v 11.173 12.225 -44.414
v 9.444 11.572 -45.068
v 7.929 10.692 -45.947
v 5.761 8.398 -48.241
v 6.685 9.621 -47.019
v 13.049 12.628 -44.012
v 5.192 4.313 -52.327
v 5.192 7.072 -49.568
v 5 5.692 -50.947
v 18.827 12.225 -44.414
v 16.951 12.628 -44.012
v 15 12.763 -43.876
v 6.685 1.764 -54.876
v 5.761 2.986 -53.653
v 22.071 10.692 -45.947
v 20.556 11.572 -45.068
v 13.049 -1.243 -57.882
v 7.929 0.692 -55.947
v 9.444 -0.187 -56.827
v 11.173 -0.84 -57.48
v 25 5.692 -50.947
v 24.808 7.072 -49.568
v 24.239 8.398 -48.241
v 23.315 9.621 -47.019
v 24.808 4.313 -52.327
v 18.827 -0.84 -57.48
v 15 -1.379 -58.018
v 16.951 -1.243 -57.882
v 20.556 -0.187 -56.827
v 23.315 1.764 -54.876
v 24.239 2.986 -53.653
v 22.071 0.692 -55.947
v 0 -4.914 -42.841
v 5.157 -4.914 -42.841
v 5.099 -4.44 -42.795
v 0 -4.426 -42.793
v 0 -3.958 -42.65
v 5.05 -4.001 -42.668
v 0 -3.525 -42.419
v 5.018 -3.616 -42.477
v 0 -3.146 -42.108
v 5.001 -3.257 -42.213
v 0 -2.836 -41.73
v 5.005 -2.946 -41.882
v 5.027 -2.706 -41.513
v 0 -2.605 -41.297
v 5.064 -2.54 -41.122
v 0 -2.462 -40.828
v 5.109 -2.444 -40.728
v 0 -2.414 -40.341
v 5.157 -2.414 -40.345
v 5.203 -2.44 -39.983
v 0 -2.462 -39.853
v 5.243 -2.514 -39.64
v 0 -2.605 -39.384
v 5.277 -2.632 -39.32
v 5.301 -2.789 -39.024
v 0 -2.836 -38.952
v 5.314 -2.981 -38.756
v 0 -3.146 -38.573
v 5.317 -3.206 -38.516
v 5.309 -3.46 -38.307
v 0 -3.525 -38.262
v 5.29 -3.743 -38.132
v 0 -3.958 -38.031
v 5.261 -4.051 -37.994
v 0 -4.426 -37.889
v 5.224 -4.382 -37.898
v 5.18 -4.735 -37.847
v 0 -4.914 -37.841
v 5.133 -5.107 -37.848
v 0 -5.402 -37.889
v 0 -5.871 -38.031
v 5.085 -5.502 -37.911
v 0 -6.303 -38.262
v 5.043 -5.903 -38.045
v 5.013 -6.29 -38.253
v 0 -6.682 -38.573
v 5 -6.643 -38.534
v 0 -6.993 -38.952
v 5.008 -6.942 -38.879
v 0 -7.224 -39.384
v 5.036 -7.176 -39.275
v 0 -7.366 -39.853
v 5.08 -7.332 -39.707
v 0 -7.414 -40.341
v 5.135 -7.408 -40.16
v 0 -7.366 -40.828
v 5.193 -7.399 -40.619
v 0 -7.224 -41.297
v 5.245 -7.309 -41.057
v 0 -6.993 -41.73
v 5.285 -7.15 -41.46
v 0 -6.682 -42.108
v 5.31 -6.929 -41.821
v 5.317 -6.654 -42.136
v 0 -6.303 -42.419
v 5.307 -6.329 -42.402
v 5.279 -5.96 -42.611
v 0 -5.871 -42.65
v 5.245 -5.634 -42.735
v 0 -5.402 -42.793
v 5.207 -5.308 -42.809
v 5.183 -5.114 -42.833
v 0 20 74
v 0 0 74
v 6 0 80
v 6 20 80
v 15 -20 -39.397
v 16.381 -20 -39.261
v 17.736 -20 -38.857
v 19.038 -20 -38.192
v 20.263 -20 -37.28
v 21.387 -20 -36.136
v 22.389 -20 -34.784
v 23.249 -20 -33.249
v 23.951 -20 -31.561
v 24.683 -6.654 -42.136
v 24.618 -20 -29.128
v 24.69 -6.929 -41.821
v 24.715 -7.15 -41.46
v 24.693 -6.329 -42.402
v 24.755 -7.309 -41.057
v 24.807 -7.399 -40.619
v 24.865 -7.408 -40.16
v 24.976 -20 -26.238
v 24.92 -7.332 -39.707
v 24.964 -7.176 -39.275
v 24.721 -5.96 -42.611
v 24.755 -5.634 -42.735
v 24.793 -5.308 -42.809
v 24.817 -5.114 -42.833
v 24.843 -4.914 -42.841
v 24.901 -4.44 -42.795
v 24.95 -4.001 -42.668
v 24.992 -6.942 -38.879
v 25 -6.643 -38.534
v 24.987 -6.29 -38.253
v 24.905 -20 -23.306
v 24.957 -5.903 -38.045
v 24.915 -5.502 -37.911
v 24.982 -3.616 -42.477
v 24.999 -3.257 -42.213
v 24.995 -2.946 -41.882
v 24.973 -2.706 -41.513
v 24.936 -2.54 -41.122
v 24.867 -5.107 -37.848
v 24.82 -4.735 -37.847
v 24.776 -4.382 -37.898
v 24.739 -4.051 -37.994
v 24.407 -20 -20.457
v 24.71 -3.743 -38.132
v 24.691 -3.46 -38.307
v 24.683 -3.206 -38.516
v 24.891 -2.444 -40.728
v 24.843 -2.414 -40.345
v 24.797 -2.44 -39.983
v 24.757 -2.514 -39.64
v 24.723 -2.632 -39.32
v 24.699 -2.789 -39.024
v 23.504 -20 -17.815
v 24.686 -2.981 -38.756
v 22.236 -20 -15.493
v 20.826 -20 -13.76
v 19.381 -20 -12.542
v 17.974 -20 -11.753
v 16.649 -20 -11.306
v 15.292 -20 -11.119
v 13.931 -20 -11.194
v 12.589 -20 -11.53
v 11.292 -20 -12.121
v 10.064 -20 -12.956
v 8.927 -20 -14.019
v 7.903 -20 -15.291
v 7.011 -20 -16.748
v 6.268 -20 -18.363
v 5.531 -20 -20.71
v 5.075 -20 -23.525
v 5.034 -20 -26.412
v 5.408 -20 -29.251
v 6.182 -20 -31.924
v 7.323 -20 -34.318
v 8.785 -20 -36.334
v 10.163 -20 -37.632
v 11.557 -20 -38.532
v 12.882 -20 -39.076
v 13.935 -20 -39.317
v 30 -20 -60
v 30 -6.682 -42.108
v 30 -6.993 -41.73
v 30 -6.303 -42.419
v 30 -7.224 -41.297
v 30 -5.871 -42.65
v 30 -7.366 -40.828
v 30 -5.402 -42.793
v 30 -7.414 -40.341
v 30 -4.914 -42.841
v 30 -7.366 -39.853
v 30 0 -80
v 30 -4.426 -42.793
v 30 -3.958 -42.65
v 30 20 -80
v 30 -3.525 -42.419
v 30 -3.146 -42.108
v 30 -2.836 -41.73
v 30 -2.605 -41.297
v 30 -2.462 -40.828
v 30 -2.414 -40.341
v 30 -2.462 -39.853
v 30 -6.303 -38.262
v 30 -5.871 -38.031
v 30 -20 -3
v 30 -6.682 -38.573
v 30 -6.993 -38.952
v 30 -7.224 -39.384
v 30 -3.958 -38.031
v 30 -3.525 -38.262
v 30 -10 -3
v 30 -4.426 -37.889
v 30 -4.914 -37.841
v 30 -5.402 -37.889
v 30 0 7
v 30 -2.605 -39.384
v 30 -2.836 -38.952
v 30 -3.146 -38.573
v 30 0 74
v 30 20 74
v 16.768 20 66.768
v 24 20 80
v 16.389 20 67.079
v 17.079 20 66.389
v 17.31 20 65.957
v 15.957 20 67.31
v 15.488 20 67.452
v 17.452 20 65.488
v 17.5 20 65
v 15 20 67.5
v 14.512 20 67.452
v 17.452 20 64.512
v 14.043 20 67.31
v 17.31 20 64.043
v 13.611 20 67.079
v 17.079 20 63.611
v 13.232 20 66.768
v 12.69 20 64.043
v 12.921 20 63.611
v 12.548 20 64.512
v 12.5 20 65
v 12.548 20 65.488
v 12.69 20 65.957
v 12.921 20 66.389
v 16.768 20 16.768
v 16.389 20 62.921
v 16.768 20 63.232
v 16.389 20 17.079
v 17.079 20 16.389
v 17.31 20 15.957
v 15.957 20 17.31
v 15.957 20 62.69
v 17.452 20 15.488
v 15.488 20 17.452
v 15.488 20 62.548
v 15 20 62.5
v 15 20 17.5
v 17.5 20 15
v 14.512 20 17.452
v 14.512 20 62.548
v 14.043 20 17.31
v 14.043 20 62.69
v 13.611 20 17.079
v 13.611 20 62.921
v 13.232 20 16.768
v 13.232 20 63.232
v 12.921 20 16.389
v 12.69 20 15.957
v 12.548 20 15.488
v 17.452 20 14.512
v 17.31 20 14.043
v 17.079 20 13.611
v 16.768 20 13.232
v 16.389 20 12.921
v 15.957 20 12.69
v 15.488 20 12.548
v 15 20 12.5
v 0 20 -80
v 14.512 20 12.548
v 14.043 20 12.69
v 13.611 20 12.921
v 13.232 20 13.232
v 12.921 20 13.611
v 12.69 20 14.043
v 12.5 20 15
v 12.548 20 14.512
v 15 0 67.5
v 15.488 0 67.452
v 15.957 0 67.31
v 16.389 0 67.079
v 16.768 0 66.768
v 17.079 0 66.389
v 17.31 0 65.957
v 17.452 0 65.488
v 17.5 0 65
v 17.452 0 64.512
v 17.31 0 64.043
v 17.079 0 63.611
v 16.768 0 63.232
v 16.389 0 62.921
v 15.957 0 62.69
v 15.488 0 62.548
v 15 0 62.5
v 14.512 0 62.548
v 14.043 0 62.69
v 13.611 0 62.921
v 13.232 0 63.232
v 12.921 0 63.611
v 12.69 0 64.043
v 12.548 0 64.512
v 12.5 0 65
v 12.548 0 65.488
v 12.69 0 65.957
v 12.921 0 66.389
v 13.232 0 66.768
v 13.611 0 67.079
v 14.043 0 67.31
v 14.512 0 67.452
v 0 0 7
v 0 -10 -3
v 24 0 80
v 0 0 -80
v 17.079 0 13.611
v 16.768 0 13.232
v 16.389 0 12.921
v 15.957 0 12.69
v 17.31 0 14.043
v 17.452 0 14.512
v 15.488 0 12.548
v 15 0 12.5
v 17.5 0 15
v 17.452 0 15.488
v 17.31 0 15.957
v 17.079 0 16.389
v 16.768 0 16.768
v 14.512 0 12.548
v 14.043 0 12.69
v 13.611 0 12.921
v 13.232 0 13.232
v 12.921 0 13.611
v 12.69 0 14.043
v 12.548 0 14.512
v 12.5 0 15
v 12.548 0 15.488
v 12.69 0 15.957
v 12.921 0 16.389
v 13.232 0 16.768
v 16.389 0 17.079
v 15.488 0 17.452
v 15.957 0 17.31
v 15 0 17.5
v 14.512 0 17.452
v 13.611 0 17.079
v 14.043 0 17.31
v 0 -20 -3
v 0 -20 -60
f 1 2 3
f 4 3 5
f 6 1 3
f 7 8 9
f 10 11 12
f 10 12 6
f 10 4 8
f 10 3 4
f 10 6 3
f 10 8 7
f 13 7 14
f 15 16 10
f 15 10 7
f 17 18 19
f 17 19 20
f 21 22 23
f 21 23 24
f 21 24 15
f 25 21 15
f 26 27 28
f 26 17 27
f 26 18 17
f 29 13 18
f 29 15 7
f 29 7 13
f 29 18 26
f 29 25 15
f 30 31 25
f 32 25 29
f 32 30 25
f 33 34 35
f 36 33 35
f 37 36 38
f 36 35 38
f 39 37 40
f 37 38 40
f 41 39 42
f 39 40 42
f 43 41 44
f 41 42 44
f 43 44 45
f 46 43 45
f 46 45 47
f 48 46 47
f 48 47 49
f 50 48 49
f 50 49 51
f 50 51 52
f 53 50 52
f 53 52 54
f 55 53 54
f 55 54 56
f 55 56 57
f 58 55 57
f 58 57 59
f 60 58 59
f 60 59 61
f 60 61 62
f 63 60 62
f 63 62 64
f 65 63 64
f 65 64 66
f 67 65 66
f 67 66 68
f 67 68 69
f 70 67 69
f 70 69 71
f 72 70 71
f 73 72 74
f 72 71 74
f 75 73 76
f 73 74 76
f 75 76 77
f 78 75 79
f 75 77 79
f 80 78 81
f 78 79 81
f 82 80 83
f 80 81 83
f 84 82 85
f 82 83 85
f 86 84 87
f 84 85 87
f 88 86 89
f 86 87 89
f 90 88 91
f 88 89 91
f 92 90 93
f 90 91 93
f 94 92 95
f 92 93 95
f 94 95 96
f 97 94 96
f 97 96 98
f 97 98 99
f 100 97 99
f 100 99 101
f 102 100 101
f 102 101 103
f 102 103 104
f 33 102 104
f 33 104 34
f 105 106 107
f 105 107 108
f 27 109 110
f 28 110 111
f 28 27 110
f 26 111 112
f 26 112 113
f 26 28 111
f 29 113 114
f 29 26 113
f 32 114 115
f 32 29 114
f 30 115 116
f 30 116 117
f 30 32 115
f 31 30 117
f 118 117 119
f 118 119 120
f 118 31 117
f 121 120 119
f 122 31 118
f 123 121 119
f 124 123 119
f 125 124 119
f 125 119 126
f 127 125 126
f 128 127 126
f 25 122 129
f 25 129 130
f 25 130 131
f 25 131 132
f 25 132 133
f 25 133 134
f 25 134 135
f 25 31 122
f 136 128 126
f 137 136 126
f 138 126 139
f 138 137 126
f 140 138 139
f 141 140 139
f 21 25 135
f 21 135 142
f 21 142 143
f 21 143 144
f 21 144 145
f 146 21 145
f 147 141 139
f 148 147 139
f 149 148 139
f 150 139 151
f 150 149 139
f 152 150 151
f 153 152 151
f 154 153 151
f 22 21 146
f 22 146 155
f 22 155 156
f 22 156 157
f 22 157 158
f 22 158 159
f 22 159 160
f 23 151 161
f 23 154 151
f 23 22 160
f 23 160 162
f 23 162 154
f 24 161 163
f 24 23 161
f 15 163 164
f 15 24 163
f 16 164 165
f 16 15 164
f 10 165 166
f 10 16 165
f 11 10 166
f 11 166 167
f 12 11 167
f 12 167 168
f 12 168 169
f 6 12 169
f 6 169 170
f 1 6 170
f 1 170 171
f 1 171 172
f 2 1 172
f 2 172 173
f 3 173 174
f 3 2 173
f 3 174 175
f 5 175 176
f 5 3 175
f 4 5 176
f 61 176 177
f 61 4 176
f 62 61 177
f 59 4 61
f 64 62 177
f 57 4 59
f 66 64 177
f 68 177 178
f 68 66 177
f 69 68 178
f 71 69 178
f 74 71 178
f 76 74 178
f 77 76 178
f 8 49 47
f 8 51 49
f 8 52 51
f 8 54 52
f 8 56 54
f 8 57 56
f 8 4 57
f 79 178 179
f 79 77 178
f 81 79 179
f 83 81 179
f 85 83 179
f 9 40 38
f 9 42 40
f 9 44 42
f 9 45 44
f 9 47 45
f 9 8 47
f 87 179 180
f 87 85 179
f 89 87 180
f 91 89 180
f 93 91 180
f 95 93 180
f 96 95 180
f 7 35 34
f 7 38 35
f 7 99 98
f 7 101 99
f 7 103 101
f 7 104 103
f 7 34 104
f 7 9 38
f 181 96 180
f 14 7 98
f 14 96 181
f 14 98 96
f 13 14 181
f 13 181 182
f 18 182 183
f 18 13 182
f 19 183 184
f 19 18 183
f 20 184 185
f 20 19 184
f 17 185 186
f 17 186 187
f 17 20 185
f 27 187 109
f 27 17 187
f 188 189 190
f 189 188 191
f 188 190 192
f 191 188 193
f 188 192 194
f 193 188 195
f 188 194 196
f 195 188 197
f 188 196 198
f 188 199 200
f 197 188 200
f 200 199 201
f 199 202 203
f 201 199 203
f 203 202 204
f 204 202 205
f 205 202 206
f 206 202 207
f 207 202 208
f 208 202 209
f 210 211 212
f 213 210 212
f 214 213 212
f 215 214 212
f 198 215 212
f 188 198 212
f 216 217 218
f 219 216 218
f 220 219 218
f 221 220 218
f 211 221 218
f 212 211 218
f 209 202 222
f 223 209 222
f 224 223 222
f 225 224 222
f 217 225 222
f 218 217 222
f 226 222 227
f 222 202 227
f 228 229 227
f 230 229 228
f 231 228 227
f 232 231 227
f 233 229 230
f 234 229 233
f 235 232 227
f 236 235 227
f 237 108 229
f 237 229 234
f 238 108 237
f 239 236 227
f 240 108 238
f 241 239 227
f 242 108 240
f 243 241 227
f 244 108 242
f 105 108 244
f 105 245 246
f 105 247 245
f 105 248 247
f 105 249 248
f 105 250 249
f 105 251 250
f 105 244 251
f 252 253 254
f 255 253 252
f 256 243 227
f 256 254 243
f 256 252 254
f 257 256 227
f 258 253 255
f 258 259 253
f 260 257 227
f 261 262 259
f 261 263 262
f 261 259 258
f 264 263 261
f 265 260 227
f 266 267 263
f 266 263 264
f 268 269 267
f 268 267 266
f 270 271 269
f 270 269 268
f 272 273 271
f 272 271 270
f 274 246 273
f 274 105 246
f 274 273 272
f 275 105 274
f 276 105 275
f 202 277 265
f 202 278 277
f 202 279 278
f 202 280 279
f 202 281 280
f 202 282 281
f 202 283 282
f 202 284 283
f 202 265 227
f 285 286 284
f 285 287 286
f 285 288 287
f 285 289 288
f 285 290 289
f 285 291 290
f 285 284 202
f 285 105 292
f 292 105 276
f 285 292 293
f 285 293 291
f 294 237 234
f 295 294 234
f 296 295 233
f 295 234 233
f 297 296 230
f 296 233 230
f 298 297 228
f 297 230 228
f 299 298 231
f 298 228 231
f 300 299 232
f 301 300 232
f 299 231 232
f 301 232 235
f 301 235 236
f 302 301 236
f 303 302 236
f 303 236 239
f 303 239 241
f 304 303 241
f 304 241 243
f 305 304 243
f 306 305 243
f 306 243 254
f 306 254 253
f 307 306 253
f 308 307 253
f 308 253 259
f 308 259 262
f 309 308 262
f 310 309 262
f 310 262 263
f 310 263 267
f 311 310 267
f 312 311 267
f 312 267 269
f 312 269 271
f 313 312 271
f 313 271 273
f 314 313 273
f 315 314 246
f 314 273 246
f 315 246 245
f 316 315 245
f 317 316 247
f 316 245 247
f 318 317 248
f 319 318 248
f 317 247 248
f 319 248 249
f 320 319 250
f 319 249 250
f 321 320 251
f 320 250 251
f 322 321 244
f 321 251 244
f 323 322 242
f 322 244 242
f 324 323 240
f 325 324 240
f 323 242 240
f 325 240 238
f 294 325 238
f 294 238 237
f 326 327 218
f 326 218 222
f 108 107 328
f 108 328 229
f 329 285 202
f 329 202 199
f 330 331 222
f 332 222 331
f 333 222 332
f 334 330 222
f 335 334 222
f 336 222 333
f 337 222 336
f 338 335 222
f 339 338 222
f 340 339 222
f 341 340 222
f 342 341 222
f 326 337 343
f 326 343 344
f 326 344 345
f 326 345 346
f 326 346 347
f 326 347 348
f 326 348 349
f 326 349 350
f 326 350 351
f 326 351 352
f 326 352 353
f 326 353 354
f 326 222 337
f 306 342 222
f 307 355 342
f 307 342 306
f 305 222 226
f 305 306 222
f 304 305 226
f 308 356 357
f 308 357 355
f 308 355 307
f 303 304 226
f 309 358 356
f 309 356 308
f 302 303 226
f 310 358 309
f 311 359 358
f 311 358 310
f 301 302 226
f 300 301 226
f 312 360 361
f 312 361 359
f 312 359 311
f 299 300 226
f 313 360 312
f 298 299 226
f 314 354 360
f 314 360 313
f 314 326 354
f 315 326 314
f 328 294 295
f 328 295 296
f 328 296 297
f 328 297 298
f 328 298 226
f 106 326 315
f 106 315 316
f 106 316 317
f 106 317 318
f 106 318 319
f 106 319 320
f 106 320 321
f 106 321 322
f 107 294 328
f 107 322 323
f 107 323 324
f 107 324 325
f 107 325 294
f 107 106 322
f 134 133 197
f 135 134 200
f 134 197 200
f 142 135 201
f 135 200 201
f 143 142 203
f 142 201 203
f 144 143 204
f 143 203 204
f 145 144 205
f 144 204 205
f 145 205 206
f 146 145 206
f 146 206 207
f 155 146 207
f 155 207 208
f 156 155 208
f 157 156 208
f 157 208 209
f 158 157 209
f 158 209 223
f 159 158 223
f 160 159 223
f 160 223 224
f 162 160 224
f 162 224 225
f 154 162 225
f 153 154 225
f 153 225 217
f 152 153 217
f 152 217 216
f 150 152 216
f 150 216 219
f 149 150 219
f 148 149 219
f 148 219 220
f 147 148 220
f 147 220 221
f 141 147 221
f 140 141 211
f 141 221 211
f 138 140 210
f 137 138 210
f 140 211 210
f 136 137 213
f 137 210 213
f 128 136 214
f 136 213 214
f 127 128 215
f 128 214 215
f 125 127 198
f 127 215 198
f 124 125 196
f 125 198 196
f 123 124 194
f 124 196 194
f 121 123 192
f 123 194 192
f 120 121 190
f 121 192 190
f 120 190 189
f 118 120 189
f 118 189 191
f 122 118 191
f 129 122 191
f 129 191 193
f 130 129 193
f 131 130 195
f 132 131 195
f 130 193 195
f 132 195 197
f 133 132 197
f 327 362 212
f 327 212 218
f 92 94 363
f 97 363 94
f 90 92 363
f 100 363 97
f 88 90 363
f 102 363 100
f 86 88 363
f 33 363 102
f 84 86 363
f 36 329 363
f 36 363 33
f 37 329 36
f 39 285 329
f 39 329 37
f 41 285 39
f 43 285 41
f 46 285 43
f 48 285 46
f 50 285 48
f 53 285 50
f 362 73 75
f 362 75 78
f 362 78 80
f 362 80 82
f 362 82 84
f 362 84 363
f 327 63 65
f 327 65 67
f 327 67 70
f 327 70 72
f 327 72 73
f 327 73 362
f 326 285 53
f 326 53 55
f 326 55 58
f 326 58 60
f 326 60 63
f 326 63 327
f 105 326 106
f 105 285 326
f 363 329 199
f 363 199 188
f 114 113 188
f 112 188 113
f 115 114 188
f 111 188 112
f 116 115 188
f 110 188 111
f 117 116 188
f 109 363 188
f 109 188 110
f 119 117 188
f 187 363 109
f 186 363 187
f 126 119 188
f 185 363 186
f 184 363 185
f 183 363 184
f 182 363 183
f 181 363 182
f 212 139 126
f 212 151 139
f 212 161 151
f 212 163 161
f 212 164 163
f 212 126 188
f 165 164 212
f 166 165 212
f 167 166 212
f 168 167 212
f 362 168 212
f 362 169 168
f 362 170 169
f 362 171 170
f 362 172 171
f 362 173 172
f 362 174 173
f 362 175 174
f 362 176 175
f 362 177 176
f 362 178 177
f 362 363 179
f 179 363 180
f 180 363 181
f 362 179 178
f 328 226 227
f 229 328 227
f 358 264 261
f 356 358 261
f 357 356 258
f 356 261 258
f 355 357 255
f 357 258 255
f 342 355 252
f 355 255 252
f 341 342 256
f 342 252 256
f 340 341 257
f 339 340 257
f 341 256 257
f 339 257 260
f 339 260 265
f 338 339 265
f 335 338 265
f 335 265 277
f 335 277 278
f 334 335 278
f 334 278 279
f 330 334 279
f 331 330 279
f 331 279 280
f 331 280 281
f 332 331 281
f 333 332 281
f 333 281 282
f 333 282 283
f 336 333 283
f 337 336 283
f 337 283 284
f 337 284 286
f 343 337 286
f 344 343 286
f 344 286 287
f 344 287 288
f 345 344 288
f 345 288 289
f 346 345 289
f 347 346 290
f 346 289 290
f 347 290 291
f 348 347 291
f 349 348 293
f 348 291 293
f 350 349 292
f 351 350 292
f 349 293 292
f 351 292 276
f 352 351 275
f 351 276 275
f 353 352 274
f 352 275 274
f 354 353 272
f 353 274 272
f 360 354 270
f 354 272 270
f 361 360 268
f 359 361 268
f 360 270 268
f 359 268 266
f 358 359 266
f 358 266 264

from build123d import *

# Parameters (mm, degrees)
Y_KSEKLIK_EKSTR_ZYON2_DEPTH = 30
IZIM3_R                     = 2.5
KES_EKSTR_ZYON1_DEPTH       = 30
PAH1_SIZE                   = 6
KES_EKSTR_ZYON2_DEPTH       = 30
KES_EKSTR_ZYON2_DEPTH_BACK  = 30
IZIM5_R                     = 10
IZIM6_R                     = 10
KES_EKSTR_ZYON3_DEPTH       = 15
IZIM7_R                     = 2.5
KES_EKSTR_ZYON4_DEPTH       = 48


with BuildPart() as part:
    # Çizim2 → Yükseklik-Ekstrüzyon2 (new body)
    with BuildSketch(Plane(origin=(0, 0, 0), x_dir=(0, 0, -1), z_dir=(1, 0, 0))):
        Polygon((-80, 20), (80, 20), (80, 0), (60, -20), (3, -20), (3, -10), (-7, 0), (-80, 0), align=None)
    extrude(amount=Y_KSEKLIK_EKSTR_ZYON2_DEPTH)

    # Çizim3 → Kes-Ekstrüzyon1 (cut)
    with BuildSketch(Plane(origin=(0, 20, 0), x_dir=(1, 0, 0), z_dir=(0, 1, 0))):
        with Locations((15, -15)):
            Circle(IZIM3_R)
        with Locations((15, -65)):
            Circle(IZIM3_R)
    extrude(amount=-KES_EKSTR_ZYON1_DEPTH, mode=Mode.SUBTRACT)

    # Pah1
    pah1_edges = [part.edges().sort_by_distance(p)[0] for p in [
        (0, 10, 80),
        (30, 10, 80),
    ]]
    chamfer(pah1_edges, length=PAH1_SIZE)

    # Çizim5 → Kes-Ekstrüzyon2 (cut, two sides: drawn at the far end of the back side and taken through both)
    with BuildSketch(Plane(origin=(0, -3.5, 3.5), x_dir=(1, 0, 0), z_dir=(0, -0.7071067811865488, 0.7071067811865462)).offset(-KES_EKSTR_ZYON2_DEPTH_BACK)):
        with Locations((15, -32)):
            Circle(IZIM5_R)
    extrude(amount=KES_EKSTR_ZYON2_DEPTH + KES_EKSTR_ZYON2_DEPTH_BACK, mode=Mode.SUBTRACT)

    # Çizim6 → Kes-Ekstrüzyon3 (cut)
    with BuildSketch(Plane(origin=(0, 17.713203436, -17.713203436), x_dir=(1, 0, 0), z_dir=(0, -0.7071067811865488, 0.7071067811865462))):
        with Locations((15, -32)):
            Circle(IZIM6_R)
    extrude(amount=-KES_EKSTR_ZYON3_DEPTH, mode=Mode.SUBTRACT)

    # Çizim7 → Kes-Ekstrüzyon4 (cut)
    with BuildSketch(Plane(origin=(30, 0, 0), x_dir=(0, 0, -1), z_dir=(1, 0, 0))):
        with Locations((40.340620434, -4.914213562)):
            Circle(IZIM7_R)
    extrude(amount=-KES_EKSTR_ZYON4_DEPTH, mode=Mode.SUBTRACT)


solid = part.part
